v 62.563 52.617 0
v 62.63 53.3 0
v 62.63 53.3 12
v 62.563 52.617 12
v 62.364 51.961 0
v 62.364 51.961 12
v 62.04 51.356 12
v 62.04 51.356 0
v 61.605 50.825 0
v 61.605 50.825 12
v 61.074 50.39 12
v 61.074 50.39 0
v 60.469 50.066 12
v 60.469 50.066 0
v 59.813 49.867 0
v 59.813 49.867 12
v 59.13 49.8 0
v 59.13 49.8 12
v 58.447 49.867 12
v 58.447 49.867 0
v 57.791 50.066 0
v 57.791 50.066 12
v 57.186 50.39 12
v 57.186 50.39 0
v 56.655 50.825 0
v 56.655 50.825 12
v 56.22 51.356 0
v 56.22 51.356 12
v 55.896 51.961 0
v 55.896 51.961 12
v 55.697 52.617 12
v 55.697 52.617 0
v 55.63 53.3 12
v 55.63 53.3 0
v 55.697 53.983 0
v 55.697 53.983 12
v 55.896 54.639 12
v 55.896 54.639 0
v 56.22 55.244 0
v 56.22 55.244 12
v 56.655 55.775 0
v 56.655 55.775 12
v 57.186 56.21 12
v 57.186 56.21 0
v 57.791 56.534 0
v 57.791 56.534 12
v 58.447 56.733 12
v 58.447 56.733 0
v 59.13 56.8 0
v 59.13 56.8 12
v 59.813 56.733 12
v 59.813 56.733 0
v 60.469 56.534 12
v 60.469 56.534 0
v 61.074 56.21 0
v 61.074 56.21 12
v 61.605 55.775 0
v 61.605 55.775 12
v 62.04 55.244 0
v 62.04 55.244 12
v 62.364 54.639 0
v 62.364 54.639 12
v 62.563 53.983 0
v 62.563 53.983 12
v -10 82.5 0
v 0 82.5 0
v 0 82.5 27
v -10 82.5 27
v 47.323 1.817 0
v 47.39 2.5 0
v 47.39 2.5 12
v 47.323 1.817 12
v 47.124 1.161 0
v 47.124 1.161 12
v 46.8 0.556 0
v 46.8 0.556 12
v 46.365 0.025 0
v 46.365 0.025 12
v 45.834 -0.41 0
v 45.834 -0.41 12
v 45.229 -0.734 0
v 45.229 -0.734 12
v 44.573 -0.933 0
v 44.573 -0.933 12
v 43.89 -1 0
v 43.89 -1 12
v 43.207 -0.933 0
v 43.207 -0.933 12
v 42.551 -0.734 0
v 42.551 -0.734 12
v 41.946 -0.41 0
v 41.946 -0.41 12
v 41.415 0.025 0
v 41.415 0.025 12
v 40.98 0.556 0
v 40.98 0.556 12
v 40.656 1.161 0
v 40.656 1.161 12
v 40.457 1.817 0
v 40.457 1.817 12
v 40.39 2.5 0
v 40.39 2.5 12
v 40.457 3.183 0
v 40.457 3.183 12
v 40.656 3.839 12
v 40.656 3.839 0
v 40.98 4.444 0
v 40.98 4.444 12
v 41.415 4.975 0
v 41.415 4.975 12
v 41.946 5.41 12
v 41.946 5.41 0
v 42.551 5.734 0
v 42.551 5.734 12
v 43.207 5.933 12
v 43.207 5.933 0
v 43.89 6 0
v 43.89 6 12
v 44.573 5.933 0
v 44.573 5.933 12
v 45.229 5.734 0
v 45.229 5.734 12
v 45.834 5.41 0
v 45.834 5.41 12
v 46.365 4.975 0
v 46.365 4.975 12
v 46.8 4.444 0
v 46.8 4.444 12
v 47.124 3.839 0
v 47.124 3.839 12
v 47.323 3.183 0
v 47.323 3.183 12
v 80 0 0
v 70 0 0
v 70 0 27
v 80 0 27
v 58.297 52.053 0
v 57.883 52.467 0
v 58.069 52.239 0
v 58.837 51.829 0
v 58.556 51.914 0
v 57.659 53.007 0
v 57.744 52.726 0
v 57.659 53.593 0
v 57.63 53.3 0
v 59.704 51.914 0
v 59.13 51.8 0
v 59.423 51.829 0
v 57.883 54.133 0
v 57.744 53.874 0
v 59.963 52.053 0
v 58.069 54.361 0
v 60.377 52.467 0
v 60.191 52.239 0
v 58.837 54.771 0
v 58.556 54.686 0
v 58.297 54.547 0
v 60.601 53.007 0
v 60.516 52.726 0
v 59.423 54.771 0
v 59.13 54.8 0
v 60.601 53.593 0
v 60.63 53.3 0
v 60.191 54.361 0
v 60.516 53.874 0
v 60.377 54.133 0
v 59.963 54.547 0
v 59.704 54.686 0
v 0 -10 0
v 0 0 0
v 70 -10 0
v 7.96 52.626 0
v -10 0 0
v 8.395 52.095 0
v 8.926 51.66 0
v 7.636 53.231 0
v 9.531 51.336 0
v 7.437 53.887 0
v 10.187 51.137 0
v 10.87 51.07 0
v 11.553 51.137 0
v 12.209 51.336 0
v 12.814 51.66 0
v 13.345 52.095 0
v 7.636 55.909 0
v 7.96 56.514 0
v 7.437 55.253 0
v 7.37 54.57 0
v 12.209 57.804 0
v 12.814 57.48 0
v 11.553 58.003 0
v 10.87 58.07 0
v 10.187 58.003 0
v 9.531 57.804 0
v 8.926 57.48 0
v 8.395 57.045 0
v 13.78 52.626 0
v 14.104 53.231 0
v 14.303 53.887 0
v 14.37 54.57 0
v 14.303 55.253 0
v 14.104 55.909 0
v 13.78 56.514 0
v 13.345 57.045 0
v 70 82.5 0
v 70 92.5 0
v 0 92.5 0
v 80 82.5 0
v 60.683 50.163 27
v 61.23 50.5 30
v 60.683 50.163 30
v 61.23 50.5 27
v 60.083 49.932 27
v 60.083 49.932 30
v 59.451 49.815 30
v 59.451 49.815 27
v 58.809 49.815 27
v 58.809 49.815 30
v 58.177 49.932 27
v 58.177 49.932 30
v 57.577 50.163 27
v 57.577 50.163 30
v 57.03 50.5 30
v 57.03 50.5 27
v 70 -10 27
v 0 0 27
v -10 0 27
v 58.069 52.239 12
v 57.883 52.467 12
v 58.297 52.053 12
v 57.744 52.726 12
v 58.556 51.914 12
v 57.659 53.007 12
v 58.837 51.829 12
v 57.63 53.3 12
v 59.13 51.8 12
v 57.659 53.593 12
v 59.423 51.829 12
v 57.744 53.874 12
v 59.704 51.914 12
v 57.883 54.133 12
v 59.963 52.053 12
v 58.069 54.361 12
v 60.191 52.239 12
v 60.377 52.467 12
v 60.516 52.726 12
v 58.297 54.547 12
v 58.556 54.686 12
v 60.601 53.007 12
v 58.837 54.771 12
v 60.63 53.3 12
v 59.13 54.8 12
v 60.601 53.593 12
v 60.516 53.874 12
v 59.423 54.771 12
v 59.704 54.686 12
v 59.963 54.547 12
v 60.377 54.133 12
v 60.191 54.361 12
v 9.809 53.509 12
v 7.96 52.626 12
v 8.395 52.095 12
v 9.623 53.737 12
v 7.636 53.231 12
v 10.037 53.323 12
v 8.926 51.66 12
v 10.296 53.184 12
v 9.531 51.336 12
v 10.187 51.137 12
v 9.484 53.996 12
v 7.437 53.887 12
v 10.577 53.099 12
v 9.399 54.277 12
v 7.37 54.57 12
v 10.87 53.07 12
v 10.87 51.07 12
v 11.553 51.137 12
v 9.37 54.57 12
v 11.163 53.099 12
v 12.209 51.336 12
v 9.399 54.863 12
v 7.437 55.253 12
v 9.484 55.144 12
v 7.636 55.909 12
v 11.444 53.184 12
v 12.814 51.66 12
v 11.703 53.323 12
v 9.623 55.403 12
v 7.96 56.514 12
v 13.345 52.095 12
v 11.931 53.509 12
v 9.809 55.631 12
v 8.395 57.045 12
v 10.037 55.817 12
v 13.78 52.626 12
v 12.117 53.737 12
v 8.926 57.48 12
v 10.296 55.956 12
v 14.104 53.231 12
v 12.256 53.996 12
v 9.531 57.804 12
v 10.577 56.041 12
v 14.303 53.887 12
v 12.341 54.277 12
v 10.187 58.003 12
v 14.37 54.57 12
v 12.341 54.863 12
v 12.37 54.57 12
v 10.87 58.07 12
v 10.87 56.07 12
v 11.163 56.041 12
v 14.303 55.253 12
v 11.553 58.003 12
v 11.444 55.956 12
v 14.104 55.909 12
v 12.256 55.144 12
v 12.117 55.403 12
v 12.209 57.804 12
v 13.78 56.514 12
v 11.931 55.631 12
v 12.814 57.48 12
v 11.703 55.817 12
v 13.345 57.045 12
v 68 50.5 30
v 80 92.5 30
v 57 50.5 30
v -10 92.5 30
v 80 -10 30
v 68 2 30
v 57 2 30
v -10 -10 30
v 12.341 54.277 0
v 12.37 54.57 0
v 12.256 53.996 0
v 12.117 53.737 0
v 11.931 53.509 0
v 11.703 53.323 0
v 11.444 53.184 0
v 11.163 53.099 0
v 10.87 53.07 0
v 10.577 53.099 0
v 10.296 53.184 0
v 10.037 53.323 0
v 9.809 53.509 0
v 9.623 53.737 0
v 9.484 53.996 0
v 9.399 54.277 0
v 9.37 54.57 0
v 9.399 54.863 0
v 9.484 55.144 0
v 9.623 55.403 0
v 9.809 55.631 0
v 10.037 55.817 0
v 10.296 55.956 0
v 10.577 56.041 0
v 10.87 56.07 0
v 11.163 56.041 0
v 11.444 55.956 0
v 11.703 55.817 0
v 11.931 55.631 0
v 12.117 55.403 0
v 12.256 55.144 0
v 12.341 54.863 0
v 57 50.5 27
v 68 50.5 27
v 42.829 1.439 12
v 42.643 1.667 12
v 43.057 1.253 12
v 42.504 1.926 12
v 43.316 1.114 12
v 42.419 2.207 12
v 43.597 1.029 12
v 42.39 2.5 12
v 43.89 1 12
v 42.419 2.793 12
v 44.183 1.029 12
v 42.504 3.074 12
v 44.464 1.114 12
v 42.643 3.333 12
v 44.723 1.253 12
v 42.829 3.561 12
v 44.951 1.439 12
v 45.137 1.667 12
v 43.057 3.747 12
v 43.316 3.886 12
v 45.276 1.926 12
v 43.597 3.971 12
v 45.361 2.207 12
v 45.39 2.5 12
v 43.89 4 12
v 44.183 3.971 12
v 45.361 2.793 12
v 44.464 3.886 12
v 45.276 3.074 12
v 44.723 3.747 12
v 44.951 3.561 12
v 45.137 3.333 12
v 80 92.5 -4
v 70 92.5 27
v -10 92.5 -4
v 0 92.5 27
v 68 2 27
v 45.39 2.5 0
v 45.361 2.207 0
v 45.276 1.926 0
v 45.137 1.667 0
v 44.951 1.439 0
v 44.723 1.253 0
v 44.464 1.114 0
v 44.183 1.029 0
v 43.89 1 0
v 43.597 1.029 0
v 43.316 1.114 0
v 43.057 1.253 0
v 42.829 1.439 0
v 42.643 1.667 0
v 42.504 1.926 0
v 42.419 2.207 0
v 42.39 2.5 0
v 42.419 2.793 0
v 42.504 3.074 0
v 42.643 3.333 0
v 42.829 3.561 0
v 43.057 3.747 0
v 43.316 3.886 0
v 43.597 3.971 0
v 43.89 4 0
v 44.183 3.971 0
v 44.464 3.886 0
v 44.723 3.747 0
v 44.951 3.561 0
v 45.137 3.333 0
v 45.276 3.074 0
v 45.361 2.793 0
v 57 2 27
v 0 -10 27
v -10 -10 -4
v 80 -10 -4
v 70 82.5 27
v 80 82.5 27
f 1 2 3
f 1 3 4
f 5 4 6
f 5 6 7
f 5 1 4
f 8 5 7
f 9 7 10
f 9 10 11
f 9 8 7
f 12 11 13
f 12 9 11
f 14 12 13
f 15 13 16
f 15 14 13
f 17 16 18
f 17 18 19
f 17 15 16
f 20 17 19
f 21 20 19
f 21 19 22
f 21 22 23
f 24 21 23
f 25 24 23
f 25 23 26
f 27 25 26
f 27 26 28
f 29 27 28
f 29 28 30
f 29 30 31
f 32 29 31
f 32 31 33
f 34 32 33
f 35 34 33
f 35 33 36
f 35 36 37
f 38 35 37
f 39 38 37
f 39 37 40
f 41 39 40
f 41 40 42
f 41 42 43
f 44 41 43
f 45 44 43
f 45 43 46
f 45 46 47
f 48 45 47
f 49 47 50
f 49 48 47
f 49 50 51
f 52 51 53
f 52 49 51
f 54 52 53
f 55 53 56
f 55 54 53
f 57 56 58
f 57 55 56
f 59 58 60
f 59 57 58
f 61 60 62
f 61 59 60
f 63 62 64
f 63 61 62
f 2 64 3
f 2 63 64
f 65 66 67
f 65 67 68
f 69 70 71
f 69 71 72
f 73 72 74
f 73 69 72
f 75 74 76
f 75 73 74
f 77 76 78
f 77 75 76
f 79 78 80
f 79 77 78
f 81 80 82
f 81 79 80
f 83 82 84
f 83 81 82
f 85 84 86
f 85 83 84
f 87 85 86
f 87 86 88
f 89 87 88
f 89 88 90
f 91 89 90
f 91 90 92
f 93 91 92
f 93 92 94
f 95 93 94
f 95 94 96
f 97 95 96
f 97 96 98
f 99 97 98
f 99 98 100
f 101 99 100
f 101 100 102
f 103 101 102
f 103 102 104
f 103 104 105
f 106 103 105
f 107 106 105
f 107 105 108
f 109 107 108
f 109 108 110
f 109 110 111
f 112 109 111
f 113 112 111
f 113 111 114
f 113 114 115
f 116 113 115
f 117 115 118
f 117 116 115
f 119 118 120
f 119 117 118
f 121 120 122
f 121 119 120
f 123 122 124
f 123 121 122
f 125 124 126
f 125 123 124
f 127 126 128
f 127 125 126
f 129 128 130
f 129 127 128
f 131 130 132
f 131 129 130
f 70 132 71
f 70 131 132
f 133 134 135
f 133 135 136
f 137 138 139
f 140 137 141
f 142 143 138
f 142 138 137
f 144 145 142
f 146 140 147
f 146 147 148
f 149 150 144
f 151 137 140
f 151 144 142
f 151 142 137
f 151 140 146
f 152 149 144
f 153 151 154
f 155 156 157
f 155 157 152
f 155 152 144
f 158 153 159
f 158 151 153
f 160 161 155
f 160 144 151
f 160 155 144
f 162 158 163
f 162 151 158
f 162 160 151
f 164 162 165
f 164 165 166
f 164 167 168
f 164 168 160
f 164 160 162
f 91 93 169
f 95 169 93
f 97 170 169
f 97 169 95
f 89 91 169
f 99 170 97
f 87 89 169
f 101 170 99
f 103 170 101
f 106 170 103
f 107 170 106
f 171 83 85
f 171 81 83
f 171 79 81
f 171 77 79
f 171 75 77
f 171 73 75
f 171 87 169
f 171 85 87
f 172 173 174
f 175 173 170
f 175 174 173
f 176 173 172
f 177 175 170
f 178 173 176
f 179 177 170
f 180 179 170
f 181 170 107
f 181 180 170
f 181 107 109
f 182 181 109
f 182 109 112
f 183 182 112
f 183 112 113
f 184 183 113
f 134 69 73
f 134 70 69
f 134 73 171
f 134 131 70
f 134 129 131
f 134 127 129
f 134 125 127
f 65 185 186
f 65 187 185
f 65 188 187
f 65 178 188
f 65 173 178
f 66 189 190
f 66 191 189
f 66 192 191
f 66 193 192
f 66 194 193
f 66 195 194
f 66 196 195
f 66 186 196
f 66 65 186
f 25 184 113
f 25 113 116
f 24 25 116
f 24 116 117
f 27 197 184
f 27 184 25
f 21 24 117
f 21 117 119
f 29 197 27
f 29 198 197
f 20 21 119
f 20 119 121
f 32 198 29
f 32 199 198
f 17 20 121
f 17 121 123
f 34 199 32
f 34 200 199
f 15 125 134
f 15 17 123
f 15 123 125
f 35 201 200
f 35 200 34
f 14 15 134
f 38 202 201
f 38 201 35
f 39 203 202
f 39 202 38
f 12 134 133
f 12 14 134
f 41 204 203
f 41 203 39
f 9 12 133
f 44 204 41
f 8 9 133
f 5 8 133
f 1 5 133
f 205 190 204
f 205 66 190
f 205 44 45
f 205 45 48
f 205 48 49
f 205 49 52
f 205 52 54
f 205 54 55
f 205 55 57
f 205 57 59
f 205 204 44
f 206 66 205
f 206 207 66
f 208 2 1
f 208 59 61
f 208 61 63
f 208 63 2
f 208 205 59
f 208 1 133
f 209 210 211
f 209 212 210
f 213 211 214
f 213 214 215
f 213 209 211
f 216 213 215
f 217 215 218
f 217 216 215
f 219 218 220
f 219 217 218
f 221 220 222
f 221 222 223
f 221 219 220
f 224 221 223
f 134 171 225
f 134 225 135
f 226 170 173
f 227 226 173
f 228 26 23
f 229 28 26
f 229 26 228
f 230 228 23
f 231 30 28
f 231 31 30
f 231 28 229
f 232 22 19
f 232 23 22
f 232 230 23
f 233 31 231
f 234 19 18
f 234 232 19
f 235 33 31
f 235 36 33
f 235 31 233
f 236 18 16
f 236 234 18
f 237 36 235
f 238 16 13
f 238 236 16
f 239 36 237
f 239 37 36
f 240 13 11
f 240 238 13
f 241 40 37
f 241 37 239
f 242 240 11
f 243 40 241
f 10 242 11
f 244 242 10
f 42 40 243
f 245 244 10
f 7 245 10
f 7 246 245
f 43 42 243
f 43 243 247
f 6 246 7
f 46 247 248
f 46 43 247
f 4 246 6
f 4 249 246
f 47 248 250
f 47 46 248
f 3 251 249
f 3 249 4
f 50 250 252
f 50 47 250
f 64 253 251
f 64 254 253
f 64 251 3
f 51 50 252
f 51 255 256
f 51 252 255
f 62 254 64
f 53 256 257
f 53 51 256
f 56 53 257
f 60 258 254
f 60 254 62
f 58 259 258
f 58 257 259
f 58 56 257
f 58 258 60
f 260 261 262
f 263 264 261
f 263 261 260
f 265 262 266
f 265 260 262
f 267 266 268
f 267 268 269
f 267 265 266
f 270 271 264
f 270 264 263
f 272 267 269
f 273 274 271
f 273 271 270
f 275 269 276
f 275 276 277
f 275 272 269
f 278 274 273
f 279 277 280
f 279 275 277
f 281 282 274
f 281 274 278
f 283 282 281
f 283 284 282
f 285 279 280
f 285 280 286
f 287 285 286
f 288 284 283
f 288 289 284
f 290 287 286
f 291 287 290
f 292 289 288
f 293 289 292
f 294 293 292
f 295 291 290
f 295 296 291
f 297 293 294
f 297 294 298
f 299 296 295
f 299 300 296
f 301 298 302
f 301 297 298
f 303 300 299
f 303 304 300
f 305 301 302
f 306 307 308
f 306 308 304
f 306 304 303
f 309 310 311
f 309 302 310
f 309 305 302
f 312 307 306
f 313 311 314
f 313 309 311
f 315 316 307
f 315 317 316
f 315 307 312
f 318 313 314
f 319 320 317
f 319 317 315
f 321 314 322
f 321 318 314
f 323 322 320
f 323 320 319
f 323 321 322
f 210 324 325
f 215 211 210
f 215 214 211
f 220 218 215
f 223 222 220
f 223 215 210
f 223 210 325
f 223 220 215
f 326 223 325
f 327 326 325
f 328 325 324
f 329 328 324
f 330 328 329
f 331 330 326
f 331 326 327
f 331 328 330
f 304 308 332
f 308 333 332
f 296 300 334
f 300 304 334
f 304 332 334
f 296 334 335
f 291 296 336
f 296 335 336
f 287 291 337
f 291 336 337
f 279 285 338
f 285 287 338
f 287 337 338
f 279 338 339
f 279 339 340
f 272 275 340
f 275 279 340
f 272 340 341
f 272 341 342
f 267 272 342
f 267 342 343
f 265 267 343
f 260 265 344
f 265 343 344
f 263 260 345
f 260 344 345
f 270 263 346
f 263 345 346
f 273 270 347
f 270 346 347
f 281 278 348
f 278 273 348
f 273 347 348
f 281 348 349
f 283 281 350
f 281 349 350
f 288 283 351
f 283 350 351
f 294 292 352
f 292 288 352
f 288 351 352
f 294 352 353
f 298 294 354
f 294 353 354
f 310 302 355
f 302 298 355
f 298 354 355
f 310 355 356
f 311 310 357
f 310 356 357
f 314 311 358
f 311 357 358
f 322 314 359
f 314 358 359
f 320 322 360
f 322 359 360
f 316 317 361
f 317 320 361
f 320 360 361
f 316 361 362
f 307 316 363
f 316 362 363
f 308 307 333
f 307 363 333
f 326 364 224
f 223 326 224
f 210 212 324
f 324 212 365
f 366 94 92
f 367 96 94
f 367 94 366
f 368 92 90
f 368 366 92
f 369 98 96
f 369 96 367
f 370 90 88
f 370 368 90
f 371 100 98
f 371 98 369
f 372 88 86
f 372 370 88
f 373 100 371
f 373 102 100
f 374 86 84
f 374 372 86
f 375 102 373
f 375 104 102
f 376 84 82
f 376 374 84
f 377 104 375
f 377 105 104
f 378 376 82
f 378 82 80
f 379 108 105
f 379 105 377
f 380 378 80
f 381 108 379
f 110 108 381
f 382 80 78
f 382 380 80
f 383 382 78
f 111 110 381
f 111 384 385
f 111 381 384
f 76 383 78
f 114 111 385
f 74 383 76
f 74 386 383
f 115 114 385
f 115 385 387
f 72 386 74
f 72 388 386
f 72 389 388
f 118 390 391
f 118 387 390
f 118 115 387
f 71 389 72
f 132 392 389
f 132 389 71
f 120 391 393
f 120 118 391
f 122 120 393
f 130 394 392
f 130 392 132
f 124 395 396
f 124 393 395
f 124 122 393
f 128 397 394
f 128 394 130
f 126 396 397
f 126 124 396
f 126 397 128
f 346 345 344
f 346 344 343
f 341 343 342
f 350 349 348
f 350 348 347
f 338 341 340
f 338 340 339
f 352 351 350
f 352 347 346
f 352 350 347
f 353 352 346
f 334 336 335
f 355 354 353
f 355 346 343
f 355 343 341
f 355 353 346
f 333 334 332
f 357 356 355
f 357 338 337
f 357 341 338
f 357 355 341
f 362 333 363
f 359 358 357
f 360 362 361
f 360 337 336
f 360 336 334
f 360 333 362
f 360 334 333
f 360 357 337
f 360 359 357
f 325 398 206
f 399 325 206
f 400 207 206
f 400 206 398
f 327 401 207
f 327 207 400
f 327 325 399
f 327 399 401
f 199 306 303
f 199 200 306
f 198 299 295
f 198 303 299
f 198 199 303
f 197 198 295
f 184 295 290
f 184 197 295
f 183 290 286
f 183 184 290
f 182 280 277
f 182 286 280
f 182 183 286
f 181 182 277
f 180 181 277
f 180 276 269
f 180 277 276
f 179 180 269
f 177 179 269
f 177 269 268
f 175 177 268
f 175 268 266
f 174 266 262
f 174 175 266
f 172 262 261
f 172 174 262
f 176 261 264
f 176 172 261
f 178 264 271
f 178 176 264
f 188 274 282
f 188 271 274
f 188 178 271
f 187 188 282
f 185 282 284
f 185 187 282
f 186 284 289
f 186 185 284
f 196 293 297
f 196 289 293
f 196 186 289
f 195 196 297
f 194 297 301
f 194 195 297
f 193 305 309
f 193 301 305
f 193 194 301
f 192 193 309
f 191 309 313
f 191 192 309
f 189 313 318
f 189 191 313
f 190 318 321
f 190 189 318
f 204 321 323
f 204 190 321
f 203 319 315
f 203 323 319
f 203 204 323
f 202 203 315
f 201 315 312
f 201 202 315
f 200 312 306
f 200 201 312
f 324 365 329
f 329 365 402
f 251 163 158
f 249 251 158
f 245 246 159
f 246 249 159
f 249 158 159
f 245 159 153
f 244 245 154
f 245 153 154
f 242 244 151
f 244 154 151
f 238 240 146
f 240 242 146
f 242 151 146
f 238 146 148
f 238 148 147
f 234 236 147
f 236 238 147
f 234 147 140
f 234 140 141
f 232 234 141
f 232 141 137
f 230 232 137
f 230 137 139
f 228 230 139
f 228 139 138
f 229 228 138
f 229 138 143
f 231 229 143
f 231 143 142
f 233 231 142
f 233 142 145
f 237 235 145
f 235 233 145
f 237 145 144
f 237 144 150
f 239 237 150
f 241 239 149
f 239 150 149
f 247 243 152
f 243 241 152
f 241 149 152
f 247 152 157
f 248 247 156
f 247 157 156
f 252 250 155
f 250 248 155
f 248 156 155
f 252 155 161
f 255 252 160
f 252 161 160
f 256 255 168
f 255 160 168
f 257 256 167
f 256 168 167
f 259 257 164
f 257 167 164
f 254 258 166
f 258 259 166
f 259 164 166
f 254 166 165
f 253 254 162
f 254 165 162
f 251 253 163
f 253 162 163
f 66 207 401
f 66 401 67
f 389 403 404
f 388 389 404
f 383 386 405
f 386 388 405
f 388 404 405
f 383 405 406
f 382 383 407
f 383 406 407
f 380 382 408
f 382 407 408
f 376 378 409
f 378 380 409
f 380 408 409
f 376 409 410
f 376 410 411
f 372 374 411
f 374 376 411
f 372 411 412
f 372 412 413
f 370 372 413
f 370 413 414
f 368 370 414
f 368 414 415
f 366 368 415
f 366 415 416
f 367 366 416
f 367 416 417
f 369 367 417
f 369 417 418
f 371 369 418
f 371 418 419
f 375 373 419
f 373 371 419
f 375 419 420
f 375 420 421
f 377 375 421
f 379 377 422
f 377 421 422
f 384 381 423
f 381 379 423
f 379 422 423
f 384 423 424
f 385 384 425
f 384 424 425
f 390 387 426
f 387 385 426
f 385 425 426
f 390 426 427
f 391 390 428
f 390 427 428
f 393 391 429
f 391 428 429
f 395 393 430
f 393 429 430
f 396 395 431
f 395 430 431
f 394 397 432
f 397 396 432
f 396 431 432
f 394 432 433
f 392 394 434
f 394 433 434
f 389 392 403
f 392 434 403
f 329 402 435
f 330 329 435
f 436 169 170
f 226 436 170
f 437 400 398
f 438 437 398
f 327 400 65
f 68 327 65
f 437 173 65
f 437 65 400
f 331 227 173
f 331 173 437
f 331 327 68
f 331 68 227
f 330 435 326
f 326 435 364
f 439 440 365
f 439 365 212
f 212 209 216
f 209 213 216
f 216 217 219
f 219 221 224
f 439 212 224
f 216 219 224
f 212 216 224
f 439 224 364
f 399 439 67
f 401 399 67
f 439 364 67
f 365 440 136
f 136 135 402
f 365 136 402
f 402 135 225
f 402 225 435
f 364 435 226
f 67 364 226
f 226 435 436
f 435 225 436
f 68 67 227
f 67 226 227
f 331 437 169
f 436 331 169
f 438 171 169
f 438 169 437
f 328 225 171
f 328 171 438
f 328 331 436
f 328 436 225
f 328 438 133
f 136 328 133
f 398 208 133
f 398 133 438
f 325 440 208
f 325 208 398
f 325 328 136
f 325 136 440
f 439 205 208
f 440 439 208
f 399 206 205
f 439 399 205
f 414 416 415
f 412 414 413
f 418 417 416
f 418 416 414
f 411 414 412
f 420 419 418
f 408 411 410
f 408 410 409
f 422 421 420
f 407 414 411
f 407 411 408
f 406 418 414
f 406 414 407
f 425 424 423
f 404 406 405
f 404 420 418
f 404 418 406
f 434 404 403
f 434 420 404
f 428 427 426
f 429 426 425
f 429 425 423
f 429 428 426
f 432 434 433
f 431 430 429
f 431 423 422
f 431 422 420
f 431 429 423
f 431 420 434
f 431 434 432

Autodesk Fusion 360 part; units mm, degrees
sketch "Esquisse1" plane through (0, 0, 0) normal (0, 0, 1) x (1, 0, 0)
  line L0 (0, 0) -> (70, 0)
  line L1 (70, 0) -> (70, 82.5)
  line L2 (70, 82.5) -> (0, 82.5)
  line L3 (0, 82.5) -> (0, 0)
  circle A0 centre (43.89, 2.5) radius 1.5
  circle A1 centre (10.87, 54.57) radius 1.5
  circle A2 centre (59.13, 53.3) radius 1.5
  line L4 (-10, -10) -> (80, -10)
  line L5 (80, -10) -> (80, 92.5)
  line L6 (80, 92.5) -> (-10, 92.5)
  line L7 (-10, 92.5) -> (-10, -10)
  line L8 (80, 92.5) -> (70, 92.5)
  line L9 (70, 92.5) -> (70, 82.5)
  line L10 (70, 82.5) -> (80, 82.5)
  line L11 (80, 82.5) -> (80, 92.5)
  line L12 (80, -10) -> (70, -10)
  line L13 (70, -10) -> (70, 0)
  line L14 (70, 0) -> (80, 0)
  line L15 (80, 0) -> (80, -10)
  line L16 (0, 0) -> (-10, 0)
  line L17 (-10, 0) -> (-10, -10)
  line L18 (-10, -10) -> (0, -10)
  line L19 (0, -10) -> (0, 0)
  line L20 (0, 82.5) -> (-10, 82.5)
  line L21 (-10, 82.5) -> (-10, 92.5)
  line L22 (-10, 92.5) -> (0, 92.5)
  line L23 (0, 92.5) -> (0, 82.5)
  line L24 (68, 2) -> (57, 2)
  line L25 (57, 2) -> (57, 50.5)
  line L26 (57, 50.5) -> (68, 50.5)
  line L27 (68, 50.5) -> (68, 2)
  line L28 (2, 50.5) -> (13, 50.5)
  line L29 (13, 50.5) -> (13, 2)
  line L30 (13, 2) -> (2, 2)
  line L31 (2, 2) -> (2, 50.5)
  line L32 (68, 80) -> (65.5, 80)
  line L33 (65.5, 80) -> (65.5, 75)
  line L34 (65.5, 75) -> (68, 75)
  line L35 (68, 75) -> (68, 80)
  line L36 (2, 80) -> (4.5, 80)
  line L37 (4.5, 80) -> (4.5, 75)
  line L38 (4.5, 75) -> (2, 75)
  line L39 (2, 75) -> (2, 80)
  circle A3 centre (10.87, 54.57) radius 3.5
  circle A4 centre (59.13, 53.3) radius 3.5
  circle A5 centre (43.89, 2.5) radius 3.5
  dimension "d1" = 70
  dimension "d2" = 82.5
  dimension "d3" = 3
  dimension "d4" = 26.11
  dimension "d5" = 2.5
  dimension "d6" = 3
  dimension "d7" = 10.87
  dimension "d8" = 27.93
  dimension "d9" = 3
  dimension "d10" = 29.2
  dimension "d12" = 90
  dimension "d13" = 102.5
  dimension "d14" = 10
  dimension "d15" = 10
  dimension "d16" = 10.87
  dimension "d17" = 11
  dimension "d18" = 48.5
  dimension "d19" = 2
  dimension "d20" = 2
  dimension "d21" = 11
  dimension "d22" = 48.5
  dimension "d23" = 2
  dimension "d24" = 2
  dimension "d25" = 2.5
  dimension "d26" = 5
  dimension "d27" = 2.5
  dimension "d28" = 5
  dimension "d29" = 2
  dimension "d30" = 2.5
  dimension "d31" = 2
  dimension "d32" = 2.5
  dimension "d35" = 7
  dimension "d36" = 7
  dimension "d37" = 7
extrude "Extrusion1" add sketch "Esquisse1" against normal blind 4 contours L0 L1 L2 L3 A5 | L3 L7 L16 L20 | L4 L7 L16 L17 L18 L19 | L0 L4 L13 L19 A5 | L0 A5 | L0 A5 | L2 L6 L9 L23 | L6 L7 L20 L21 L22 L23 | L1 L5 L10 L14 | L5 L6 L8 L9 L10 L11 | L4 L5 L12 L13 L14 L15 | A0 | A1 | A2 | L24 L25 L26 L27 A4 | L26 A4 | L26 A4 | L28 L29 L30 L31 | L32 L33 L34 L35 | L36 L37 L38 L39 | A3
extrude "Extrusion2" add sketch "Esquisse1" along normal blind 12 contours L0 A5 | L0 A5 | L26 A4 | L26 A4 | A3
extrude "Extrusion3" add sketch "Esquisse1" along normal blind 27 contours L4 L7 L16 L17 L18 L19 | L6 L7 L20 L21 L22 L23 | L5 L6 L8 L9 L10 L11 | L4 L5 L12 L13 L14 L15
sketch "Esquisse3" plane through (0, 0, 27) normal (0, 0, 1) x (-1, 0, 0)
  line L0 (-80, 0) -> (-70, 0)
  line L1 (-70, 0) -> (-70, 10)
  line L2 (-70, 10) -> (-80, 10)
  line L3 (-80, 10) -> (-80, 0)
  line L4 (10, 10) -> (-80, 10)
  line L5 (-80, 10) -> (-80, -92.5)
  line L6 (-80, -92.5) -> (10, -92.5)
  line L7 (10, -92.5) -> (10, 10)
  dimension "d42" = 90
  dimension "d43" = 102.5
extrude "Extrusion4" add sketch "Esquisse3" along normal blind 3
extrude "Extrusion5" cut sketch "Esquisse1" along normal blind 40 contours L24 L25 L26 L27 A4
